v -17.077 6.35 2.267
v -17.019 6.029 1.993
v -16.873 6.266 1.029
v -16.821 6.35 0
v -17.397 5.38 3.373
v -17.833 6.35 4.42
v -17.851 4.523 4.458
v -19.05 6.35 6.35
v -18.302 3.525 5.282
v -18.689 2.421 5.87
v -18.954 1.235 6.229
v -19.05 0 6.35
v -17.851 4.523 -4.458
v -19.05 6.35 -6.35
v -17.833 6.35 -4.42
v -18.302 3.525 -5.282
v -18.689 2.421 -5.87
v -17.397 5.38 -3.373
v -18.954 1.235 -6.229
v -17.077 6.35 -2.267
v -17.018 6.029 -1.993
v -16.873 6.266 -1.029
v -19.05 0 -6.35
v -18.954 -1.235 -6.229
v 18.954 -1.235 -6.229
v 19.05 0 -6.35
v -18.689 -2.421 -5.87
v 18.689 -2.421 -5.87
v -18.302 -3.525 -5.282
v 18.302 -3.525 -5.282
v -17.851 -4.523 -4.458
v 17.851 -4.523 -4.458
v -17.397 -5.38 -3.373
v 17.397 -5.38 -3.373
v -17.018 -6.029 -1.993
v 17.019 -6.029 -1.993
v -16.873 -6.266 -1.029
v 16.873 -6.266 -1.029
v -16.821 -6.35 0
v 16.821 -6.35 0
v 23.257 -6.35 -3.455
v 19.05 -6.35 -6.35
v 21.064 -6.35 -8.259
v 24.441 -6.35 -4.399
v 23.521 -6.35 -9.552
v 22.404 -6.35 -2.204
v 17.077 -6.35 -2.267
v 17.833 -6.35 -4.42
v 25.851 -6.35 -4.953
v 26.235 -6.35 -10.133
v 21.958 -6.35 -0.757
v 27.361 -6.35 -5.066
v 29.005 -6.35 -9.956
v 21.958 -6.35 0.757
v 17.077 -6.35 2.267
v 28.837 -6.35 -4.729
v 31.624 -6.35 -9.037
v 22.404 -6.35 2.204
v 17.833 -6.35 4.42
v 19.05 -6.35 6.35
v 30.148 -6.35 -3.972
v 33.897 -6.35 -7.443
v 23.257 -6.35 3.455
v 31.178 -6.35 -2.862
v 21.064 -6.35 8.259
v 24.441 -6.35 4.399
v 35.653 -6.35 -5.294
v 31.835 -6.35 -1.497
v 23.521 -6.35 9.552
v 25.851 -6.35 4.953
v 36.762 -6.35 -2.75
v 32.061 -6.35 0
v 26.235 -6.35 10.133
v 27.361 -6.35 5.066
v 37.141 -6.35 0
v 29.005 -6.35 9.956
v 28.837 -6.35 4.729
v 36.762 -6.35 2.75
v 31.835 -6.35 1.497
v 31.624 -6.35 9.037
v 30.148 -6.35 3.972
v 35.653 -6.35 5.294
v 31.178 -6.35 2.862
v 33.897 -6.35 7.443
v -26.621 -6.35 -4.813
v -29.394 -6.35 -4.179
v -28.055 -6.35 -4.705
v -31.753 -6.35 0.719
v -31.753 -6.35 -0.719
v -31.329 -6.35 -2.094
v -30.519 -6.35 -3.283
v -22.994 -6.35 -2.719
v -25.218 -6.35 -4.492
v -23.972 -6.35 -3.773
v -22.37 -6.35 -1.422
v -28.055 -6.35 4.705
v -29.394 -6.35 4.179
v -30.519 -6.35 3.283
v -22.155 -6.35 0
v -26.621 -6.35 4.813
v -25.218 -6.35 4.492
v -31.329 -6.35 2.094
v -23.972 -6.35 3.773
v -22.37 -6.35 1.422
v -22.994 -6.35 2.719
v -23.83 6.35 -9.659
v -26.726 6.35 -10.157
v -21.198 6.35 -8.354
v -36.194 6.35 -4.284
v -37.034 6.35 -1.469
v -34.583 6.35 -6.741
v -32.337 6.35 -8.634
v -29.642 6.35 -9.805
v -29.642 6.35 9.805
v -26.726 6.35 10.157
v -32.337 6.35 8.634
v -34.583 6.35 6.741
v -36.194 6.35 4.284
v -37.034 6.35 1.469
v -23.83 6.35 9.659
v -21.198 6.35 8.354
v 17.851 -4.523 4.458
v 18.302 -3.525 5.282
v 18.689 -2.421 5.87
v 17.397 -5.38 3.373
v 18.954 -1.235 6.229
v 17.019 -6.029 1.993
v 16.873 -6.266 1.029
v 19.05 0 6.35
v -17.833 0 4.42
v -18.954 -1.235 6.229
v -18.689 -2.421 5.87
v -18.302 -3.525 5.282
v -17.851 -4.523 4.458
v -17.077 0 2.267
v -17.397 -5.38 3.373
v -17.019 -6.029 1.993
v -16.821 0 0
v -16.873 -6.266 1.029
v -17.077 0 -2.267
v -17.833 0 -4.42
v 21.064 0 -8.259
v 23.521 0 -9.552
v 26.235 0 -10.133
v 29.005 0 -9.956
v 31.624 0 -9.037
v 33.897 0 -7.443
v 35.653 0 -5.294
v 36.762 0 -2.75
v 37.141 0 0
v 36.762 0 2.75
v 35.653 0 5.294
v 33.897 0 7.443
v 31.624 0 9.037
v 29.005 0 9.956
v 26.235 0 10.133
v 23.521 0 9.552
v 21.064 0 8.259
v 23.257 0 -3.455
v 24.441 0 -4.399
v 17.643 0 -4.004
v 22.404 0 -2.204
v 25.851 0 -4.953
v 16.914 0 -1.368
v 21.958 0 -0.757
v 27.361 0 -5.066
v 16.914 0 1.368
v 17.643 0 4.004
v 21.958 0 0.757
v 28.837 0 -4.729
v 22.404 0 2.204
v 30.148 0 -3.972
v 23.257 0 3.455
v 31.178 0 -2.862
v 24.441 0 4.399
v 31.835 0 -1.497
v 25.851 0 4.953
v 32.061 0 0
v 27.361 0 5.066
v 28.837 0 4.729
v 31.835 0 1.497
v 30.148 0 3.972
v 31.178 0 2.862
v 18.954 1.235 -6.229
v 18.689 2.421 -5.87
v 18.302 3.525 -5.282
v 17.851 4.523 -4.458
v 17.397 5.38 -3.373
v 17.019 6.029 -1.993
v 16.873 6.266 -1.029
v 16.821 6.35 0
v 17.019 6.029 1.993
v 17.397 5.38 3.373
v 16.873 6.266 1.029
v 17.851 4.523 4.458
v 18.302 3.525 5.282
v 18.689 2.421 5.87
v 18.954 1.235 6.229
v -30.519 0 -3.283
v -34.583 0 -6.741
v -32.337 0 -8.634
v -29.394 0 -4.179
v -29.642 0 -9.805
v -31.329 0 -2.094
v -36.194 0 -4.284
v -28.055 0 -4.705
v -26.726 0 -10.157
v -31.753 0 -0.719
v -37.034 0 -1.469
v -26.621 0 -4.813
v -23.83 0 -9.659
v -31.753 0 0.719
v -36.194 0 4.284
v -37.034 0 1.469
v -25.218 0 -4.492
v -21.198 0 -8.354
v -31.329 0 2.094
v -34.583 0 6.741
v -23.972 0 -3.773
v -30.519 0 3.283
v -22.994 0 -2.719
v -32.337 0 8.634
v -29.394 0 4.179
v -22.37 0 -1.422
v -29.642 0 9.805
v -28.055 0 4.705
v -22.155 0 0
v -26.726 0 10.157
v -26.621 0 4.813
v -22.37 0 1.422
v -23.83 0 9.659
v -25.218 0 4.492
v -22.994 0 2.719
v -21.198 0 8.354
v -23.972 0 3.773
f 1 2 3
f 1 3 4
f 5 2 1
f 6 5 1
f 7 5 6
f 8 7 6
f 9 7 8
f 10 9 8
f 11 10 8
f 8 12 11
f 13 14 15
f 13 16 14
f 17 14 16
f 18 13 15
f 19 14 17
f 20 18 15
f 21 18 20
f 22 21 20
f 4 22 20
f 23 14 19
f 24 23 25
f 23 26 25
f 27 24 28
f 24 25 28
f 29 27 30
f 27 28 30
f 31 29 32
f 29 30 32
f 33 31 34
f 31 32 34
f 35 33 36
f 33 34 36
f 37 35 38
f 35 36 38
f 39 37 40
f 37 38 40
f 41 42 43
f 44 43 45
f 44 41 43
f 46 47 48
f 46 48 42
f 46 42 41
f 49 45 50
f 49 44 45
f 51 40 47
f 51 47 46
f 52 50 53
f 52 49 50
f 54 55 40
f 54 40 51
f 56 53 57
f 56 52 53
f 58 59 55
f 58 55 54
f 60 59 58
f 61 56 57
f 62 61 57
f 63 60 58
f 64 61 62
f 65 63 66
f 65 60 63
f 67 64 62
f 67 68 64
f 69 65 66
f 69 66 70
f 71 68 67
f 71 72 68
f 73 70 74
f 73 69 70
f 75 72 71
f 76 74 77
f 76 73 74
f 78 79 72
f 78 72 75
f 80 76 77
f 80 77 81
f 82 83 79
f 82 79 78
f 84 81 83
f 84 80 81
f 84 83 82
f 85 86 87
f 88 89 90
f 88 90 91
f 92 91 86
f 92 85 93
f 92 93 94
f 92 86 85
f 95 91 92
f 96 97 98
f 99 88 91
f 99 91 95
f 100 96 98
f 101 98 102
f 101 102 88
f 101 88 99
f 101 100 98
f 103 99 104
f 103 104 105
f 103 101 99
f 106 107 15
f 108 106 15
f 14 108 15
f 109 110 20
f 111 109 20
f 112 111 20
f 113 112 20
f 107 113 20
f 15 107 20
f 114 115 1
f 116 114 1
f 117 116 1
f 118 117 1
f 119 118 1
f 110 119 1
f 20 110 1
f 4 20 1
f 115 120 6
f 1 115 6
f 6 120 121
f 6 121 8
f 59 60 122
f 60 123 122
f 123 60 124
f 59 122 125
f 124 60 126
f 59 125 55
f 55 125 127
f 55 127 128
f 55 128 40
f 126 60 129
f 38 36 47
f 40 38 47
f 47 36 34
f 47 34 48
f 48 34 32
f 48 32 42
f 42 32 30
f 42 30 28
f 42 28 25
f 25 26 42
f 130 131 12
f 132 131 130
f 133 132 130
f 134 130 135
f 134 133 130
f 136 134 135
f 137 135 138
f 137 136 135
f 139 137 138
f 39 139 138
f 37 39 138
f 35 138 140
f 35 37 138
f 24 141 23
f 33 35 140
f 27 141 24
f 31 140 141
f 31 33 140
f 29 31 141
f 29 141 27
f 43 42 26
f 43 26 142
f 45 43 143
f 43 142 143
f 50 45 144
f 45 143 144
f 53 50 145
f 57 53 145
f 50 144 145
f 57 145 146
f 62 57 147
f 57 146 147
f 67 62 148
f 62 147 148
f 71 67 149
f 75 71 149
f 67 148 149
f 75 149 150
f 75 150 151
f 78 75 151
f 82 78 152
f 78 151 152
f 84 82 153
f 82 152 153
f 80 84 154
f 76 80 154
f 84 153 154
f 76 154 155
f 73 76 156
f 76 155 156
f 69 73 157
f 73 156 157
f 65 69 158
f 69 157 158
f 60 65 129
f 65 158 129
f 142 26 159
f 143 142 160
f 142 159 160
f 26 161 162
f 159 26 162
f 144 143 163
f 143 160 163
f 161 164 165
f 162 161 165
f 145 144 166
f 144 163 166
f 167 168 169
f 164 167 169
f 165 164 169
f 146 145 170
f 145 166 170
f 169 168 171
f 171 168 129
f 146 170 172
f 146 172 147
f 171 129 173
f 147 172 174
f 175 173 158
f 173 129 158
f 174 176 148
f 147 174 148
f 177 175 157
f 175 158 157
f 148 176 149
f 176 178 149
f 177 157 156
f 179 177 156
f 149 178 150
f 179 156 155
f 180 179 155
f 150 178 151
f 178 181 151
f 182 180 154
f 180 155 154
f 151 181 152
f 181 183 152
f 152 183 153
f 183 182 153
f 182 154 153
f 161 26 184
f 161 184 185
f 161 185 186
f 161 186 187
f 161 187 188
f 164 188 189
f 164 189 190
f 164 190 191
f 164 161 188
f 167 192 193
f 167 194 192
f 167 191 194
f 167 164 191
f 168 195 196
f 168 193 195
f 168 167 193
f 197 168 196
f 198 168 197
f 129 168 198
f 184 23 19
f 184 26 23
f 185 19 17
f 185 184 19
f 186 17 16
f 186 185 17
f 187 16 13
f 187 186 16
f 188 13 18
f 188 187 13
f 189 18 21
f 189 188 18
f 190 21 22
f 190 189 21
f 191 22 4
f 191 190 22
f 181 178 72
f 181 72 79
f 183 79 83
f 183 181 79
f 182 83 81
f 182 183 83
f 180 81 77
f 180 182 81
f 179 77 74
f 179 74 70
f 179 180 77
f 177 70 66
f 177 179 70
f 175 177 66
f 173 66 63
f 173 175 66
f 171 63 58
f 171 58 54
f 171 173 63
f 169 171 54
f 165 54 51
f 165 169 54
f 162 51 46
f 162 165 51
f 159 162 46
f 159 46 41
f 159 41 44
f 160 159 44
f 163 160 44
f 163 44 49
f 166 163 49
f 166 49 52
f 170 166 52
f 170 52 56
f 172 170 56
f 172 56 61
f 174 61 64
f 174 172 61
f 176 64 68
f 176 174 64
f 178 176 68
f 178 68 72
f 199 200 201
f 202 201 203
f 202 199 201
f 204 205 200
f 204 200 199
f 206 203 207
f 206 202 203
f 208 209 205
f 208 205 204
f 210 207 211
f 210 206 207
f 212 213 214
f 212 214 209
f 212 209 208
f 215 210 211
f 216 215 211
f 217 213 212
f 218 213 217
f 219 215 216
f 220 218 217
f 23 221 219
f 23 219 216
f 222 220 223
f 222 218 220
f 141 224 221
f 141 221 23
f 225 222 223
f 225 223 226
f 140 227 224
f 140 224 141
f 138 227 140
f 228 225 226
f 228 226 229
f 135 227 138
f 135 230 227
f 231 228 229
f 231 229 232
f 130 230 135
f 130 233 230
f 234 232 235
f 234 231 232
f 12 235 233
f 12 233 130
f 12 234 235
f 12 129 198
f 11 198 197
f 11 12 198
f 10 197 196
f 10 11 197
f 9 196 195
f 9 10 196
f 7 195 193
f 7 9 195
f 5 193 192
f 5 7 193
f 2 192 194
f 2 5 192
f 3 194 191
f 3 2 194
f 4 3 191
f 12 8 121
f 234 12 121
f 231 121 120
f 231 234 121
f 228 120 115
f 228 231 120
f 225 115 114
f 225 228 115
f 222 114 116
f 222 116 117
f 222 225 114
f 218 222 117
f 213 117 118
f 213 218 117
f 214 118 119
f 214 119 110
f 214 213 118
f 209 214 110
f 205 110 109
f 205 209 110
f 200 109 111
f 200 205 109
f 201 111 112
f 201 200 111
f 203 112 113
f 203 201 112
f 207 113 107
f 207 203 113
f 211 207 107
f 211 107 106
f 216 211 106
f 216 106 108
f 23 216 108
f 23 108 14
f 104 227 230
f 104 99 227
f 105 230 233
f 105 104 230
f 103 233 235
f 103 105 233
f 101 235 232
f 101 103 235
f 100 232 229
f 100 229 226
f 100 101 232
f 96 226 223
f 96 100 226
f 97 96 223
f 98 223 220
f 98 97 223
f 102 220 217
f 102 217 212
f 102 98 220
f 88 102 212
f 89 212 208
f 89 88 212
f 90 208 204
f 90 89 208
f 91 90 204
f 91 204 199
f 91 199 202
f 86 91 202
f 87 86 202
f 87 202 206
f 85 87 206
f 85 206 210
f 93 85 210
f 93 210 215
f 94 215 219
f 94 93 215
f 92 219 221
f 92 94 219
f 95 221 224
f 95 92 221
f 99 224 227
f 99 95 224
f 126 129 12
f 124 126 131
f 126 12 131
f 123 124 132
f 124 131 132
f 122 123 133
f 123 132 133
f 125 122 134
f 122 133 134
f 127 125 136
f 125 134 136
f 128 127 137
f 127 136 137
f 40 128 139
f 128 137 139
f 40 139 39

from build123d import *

# Parameters (mm, degrees)
F1_DEPTH = 6.35
F2_R     = 6.3499
F0_R     = 5.08
F3_DEPTH = 6.35
F0_R_2   = 4.826
F4_DEPTH = 6.35
F5_DEPTH = 6.35


# Not quite as in the source:
# - a fillet or chamfer is up to 0.001 mm smaller than in the source, because OpenCascade refuses the exact size


with BuildPart() as f1:
    # F0 (on Front) → F1 (new body, symmetric)
    with BuildSketch(Plane.XZ):
        with BuildLine():
            Line((19.05, 6.35), (-19.05, 6.35))
            ThreePointArc((-19.05, 6.35), (-17.3945407024, 3.3649028089), (-16.821147458, 0))
            ThreePointArc((-16.821147458, 0), (-17.3945407024, -3.3649028089), (-19.05, -6.35))
            Line((-19.05, -6.35), (19.05, -6.35))
            ThreePointArc((19.05, -6.35), (16.821147458, 0), (19.05, 6.35))
        make_face()
    extrude(amount=F1_DEPTH, both=True)

    # F2 (radius 6.35 in the source; OpenCascade refuses exactly that, so slightly less here)
    f2_edges = [f1.edges().sort_by_distance(p)[0] for p in [
        (0, -6.35, 6.35),
        (0, 6.35, 6.35),
        (0, -6.35, -6.35),
        (0, 6.35, -6.35),
    ]]
    fillet(f2_edges, radius=F2_R)

    # F0 (on Front) → F3 (join)
    with BuildSketch(Plane.XZ):
        with BuildLine():
            ThreePointArc((37.141147458, 0), (30.3460502669, 9.5866067556), (19.05, 6.35))
            Line((19.05, 6.35), (19.05, -6.35))
            ThreePointArc((19.05, -6.35), (30.3460502669, -9.5866067556), (37.141147458, 0))
        make_face()
        with Locations((26.981147458, 0)):
            Circle(F0_R, mode=Mode.SUBTRACT)
        with BuildLine():
            Line((19.05, -6.35), (19.05, 6.35))
            ThreePointArc((19.05, 6.35), (16.821147458, 0), (19.05, -6.35))
        make_face()
    extrude(amount=F3_DEPTH)

    # F0 (on Front) → F4 (join)
    with BuildSketch(Plane.XZ):
        with BuildLine():
            Line((-19.05, -6.35), (-19.05, 6.35))
            ThreePointArc((-19.05, 6.35), (-37.141147458, 0), (-19.05, -6.35))
        make_face()
        with Locations((-26.981147458, 0)):
            Circle(F0_R_2, mode=Mode.SUBTRACT)
        with BuildLine():
            ThreePointArc((-16.821147458, 0), (-17.3945407024, 3.3649028089), (-19.05, 6.35))
            Line((-19.05, 6.35), (-19.05, -6.35))
            ThreePointArc((-19.05, -6.35), (-17.3945407024, -3.3649028089), (-16.821147458, 0))
        make_face()
    extrude(amount=-F4_DEPTH)

    # F0 (on Front) → F5 (join, symmetric)
    with BuildSketch(Plane.XZ):
        with Locations((-26.981147458, 0)):
            Circle(F0_R_2)
    extrude(amount=F5_DEPTH, both=True)


solid = f1.part
